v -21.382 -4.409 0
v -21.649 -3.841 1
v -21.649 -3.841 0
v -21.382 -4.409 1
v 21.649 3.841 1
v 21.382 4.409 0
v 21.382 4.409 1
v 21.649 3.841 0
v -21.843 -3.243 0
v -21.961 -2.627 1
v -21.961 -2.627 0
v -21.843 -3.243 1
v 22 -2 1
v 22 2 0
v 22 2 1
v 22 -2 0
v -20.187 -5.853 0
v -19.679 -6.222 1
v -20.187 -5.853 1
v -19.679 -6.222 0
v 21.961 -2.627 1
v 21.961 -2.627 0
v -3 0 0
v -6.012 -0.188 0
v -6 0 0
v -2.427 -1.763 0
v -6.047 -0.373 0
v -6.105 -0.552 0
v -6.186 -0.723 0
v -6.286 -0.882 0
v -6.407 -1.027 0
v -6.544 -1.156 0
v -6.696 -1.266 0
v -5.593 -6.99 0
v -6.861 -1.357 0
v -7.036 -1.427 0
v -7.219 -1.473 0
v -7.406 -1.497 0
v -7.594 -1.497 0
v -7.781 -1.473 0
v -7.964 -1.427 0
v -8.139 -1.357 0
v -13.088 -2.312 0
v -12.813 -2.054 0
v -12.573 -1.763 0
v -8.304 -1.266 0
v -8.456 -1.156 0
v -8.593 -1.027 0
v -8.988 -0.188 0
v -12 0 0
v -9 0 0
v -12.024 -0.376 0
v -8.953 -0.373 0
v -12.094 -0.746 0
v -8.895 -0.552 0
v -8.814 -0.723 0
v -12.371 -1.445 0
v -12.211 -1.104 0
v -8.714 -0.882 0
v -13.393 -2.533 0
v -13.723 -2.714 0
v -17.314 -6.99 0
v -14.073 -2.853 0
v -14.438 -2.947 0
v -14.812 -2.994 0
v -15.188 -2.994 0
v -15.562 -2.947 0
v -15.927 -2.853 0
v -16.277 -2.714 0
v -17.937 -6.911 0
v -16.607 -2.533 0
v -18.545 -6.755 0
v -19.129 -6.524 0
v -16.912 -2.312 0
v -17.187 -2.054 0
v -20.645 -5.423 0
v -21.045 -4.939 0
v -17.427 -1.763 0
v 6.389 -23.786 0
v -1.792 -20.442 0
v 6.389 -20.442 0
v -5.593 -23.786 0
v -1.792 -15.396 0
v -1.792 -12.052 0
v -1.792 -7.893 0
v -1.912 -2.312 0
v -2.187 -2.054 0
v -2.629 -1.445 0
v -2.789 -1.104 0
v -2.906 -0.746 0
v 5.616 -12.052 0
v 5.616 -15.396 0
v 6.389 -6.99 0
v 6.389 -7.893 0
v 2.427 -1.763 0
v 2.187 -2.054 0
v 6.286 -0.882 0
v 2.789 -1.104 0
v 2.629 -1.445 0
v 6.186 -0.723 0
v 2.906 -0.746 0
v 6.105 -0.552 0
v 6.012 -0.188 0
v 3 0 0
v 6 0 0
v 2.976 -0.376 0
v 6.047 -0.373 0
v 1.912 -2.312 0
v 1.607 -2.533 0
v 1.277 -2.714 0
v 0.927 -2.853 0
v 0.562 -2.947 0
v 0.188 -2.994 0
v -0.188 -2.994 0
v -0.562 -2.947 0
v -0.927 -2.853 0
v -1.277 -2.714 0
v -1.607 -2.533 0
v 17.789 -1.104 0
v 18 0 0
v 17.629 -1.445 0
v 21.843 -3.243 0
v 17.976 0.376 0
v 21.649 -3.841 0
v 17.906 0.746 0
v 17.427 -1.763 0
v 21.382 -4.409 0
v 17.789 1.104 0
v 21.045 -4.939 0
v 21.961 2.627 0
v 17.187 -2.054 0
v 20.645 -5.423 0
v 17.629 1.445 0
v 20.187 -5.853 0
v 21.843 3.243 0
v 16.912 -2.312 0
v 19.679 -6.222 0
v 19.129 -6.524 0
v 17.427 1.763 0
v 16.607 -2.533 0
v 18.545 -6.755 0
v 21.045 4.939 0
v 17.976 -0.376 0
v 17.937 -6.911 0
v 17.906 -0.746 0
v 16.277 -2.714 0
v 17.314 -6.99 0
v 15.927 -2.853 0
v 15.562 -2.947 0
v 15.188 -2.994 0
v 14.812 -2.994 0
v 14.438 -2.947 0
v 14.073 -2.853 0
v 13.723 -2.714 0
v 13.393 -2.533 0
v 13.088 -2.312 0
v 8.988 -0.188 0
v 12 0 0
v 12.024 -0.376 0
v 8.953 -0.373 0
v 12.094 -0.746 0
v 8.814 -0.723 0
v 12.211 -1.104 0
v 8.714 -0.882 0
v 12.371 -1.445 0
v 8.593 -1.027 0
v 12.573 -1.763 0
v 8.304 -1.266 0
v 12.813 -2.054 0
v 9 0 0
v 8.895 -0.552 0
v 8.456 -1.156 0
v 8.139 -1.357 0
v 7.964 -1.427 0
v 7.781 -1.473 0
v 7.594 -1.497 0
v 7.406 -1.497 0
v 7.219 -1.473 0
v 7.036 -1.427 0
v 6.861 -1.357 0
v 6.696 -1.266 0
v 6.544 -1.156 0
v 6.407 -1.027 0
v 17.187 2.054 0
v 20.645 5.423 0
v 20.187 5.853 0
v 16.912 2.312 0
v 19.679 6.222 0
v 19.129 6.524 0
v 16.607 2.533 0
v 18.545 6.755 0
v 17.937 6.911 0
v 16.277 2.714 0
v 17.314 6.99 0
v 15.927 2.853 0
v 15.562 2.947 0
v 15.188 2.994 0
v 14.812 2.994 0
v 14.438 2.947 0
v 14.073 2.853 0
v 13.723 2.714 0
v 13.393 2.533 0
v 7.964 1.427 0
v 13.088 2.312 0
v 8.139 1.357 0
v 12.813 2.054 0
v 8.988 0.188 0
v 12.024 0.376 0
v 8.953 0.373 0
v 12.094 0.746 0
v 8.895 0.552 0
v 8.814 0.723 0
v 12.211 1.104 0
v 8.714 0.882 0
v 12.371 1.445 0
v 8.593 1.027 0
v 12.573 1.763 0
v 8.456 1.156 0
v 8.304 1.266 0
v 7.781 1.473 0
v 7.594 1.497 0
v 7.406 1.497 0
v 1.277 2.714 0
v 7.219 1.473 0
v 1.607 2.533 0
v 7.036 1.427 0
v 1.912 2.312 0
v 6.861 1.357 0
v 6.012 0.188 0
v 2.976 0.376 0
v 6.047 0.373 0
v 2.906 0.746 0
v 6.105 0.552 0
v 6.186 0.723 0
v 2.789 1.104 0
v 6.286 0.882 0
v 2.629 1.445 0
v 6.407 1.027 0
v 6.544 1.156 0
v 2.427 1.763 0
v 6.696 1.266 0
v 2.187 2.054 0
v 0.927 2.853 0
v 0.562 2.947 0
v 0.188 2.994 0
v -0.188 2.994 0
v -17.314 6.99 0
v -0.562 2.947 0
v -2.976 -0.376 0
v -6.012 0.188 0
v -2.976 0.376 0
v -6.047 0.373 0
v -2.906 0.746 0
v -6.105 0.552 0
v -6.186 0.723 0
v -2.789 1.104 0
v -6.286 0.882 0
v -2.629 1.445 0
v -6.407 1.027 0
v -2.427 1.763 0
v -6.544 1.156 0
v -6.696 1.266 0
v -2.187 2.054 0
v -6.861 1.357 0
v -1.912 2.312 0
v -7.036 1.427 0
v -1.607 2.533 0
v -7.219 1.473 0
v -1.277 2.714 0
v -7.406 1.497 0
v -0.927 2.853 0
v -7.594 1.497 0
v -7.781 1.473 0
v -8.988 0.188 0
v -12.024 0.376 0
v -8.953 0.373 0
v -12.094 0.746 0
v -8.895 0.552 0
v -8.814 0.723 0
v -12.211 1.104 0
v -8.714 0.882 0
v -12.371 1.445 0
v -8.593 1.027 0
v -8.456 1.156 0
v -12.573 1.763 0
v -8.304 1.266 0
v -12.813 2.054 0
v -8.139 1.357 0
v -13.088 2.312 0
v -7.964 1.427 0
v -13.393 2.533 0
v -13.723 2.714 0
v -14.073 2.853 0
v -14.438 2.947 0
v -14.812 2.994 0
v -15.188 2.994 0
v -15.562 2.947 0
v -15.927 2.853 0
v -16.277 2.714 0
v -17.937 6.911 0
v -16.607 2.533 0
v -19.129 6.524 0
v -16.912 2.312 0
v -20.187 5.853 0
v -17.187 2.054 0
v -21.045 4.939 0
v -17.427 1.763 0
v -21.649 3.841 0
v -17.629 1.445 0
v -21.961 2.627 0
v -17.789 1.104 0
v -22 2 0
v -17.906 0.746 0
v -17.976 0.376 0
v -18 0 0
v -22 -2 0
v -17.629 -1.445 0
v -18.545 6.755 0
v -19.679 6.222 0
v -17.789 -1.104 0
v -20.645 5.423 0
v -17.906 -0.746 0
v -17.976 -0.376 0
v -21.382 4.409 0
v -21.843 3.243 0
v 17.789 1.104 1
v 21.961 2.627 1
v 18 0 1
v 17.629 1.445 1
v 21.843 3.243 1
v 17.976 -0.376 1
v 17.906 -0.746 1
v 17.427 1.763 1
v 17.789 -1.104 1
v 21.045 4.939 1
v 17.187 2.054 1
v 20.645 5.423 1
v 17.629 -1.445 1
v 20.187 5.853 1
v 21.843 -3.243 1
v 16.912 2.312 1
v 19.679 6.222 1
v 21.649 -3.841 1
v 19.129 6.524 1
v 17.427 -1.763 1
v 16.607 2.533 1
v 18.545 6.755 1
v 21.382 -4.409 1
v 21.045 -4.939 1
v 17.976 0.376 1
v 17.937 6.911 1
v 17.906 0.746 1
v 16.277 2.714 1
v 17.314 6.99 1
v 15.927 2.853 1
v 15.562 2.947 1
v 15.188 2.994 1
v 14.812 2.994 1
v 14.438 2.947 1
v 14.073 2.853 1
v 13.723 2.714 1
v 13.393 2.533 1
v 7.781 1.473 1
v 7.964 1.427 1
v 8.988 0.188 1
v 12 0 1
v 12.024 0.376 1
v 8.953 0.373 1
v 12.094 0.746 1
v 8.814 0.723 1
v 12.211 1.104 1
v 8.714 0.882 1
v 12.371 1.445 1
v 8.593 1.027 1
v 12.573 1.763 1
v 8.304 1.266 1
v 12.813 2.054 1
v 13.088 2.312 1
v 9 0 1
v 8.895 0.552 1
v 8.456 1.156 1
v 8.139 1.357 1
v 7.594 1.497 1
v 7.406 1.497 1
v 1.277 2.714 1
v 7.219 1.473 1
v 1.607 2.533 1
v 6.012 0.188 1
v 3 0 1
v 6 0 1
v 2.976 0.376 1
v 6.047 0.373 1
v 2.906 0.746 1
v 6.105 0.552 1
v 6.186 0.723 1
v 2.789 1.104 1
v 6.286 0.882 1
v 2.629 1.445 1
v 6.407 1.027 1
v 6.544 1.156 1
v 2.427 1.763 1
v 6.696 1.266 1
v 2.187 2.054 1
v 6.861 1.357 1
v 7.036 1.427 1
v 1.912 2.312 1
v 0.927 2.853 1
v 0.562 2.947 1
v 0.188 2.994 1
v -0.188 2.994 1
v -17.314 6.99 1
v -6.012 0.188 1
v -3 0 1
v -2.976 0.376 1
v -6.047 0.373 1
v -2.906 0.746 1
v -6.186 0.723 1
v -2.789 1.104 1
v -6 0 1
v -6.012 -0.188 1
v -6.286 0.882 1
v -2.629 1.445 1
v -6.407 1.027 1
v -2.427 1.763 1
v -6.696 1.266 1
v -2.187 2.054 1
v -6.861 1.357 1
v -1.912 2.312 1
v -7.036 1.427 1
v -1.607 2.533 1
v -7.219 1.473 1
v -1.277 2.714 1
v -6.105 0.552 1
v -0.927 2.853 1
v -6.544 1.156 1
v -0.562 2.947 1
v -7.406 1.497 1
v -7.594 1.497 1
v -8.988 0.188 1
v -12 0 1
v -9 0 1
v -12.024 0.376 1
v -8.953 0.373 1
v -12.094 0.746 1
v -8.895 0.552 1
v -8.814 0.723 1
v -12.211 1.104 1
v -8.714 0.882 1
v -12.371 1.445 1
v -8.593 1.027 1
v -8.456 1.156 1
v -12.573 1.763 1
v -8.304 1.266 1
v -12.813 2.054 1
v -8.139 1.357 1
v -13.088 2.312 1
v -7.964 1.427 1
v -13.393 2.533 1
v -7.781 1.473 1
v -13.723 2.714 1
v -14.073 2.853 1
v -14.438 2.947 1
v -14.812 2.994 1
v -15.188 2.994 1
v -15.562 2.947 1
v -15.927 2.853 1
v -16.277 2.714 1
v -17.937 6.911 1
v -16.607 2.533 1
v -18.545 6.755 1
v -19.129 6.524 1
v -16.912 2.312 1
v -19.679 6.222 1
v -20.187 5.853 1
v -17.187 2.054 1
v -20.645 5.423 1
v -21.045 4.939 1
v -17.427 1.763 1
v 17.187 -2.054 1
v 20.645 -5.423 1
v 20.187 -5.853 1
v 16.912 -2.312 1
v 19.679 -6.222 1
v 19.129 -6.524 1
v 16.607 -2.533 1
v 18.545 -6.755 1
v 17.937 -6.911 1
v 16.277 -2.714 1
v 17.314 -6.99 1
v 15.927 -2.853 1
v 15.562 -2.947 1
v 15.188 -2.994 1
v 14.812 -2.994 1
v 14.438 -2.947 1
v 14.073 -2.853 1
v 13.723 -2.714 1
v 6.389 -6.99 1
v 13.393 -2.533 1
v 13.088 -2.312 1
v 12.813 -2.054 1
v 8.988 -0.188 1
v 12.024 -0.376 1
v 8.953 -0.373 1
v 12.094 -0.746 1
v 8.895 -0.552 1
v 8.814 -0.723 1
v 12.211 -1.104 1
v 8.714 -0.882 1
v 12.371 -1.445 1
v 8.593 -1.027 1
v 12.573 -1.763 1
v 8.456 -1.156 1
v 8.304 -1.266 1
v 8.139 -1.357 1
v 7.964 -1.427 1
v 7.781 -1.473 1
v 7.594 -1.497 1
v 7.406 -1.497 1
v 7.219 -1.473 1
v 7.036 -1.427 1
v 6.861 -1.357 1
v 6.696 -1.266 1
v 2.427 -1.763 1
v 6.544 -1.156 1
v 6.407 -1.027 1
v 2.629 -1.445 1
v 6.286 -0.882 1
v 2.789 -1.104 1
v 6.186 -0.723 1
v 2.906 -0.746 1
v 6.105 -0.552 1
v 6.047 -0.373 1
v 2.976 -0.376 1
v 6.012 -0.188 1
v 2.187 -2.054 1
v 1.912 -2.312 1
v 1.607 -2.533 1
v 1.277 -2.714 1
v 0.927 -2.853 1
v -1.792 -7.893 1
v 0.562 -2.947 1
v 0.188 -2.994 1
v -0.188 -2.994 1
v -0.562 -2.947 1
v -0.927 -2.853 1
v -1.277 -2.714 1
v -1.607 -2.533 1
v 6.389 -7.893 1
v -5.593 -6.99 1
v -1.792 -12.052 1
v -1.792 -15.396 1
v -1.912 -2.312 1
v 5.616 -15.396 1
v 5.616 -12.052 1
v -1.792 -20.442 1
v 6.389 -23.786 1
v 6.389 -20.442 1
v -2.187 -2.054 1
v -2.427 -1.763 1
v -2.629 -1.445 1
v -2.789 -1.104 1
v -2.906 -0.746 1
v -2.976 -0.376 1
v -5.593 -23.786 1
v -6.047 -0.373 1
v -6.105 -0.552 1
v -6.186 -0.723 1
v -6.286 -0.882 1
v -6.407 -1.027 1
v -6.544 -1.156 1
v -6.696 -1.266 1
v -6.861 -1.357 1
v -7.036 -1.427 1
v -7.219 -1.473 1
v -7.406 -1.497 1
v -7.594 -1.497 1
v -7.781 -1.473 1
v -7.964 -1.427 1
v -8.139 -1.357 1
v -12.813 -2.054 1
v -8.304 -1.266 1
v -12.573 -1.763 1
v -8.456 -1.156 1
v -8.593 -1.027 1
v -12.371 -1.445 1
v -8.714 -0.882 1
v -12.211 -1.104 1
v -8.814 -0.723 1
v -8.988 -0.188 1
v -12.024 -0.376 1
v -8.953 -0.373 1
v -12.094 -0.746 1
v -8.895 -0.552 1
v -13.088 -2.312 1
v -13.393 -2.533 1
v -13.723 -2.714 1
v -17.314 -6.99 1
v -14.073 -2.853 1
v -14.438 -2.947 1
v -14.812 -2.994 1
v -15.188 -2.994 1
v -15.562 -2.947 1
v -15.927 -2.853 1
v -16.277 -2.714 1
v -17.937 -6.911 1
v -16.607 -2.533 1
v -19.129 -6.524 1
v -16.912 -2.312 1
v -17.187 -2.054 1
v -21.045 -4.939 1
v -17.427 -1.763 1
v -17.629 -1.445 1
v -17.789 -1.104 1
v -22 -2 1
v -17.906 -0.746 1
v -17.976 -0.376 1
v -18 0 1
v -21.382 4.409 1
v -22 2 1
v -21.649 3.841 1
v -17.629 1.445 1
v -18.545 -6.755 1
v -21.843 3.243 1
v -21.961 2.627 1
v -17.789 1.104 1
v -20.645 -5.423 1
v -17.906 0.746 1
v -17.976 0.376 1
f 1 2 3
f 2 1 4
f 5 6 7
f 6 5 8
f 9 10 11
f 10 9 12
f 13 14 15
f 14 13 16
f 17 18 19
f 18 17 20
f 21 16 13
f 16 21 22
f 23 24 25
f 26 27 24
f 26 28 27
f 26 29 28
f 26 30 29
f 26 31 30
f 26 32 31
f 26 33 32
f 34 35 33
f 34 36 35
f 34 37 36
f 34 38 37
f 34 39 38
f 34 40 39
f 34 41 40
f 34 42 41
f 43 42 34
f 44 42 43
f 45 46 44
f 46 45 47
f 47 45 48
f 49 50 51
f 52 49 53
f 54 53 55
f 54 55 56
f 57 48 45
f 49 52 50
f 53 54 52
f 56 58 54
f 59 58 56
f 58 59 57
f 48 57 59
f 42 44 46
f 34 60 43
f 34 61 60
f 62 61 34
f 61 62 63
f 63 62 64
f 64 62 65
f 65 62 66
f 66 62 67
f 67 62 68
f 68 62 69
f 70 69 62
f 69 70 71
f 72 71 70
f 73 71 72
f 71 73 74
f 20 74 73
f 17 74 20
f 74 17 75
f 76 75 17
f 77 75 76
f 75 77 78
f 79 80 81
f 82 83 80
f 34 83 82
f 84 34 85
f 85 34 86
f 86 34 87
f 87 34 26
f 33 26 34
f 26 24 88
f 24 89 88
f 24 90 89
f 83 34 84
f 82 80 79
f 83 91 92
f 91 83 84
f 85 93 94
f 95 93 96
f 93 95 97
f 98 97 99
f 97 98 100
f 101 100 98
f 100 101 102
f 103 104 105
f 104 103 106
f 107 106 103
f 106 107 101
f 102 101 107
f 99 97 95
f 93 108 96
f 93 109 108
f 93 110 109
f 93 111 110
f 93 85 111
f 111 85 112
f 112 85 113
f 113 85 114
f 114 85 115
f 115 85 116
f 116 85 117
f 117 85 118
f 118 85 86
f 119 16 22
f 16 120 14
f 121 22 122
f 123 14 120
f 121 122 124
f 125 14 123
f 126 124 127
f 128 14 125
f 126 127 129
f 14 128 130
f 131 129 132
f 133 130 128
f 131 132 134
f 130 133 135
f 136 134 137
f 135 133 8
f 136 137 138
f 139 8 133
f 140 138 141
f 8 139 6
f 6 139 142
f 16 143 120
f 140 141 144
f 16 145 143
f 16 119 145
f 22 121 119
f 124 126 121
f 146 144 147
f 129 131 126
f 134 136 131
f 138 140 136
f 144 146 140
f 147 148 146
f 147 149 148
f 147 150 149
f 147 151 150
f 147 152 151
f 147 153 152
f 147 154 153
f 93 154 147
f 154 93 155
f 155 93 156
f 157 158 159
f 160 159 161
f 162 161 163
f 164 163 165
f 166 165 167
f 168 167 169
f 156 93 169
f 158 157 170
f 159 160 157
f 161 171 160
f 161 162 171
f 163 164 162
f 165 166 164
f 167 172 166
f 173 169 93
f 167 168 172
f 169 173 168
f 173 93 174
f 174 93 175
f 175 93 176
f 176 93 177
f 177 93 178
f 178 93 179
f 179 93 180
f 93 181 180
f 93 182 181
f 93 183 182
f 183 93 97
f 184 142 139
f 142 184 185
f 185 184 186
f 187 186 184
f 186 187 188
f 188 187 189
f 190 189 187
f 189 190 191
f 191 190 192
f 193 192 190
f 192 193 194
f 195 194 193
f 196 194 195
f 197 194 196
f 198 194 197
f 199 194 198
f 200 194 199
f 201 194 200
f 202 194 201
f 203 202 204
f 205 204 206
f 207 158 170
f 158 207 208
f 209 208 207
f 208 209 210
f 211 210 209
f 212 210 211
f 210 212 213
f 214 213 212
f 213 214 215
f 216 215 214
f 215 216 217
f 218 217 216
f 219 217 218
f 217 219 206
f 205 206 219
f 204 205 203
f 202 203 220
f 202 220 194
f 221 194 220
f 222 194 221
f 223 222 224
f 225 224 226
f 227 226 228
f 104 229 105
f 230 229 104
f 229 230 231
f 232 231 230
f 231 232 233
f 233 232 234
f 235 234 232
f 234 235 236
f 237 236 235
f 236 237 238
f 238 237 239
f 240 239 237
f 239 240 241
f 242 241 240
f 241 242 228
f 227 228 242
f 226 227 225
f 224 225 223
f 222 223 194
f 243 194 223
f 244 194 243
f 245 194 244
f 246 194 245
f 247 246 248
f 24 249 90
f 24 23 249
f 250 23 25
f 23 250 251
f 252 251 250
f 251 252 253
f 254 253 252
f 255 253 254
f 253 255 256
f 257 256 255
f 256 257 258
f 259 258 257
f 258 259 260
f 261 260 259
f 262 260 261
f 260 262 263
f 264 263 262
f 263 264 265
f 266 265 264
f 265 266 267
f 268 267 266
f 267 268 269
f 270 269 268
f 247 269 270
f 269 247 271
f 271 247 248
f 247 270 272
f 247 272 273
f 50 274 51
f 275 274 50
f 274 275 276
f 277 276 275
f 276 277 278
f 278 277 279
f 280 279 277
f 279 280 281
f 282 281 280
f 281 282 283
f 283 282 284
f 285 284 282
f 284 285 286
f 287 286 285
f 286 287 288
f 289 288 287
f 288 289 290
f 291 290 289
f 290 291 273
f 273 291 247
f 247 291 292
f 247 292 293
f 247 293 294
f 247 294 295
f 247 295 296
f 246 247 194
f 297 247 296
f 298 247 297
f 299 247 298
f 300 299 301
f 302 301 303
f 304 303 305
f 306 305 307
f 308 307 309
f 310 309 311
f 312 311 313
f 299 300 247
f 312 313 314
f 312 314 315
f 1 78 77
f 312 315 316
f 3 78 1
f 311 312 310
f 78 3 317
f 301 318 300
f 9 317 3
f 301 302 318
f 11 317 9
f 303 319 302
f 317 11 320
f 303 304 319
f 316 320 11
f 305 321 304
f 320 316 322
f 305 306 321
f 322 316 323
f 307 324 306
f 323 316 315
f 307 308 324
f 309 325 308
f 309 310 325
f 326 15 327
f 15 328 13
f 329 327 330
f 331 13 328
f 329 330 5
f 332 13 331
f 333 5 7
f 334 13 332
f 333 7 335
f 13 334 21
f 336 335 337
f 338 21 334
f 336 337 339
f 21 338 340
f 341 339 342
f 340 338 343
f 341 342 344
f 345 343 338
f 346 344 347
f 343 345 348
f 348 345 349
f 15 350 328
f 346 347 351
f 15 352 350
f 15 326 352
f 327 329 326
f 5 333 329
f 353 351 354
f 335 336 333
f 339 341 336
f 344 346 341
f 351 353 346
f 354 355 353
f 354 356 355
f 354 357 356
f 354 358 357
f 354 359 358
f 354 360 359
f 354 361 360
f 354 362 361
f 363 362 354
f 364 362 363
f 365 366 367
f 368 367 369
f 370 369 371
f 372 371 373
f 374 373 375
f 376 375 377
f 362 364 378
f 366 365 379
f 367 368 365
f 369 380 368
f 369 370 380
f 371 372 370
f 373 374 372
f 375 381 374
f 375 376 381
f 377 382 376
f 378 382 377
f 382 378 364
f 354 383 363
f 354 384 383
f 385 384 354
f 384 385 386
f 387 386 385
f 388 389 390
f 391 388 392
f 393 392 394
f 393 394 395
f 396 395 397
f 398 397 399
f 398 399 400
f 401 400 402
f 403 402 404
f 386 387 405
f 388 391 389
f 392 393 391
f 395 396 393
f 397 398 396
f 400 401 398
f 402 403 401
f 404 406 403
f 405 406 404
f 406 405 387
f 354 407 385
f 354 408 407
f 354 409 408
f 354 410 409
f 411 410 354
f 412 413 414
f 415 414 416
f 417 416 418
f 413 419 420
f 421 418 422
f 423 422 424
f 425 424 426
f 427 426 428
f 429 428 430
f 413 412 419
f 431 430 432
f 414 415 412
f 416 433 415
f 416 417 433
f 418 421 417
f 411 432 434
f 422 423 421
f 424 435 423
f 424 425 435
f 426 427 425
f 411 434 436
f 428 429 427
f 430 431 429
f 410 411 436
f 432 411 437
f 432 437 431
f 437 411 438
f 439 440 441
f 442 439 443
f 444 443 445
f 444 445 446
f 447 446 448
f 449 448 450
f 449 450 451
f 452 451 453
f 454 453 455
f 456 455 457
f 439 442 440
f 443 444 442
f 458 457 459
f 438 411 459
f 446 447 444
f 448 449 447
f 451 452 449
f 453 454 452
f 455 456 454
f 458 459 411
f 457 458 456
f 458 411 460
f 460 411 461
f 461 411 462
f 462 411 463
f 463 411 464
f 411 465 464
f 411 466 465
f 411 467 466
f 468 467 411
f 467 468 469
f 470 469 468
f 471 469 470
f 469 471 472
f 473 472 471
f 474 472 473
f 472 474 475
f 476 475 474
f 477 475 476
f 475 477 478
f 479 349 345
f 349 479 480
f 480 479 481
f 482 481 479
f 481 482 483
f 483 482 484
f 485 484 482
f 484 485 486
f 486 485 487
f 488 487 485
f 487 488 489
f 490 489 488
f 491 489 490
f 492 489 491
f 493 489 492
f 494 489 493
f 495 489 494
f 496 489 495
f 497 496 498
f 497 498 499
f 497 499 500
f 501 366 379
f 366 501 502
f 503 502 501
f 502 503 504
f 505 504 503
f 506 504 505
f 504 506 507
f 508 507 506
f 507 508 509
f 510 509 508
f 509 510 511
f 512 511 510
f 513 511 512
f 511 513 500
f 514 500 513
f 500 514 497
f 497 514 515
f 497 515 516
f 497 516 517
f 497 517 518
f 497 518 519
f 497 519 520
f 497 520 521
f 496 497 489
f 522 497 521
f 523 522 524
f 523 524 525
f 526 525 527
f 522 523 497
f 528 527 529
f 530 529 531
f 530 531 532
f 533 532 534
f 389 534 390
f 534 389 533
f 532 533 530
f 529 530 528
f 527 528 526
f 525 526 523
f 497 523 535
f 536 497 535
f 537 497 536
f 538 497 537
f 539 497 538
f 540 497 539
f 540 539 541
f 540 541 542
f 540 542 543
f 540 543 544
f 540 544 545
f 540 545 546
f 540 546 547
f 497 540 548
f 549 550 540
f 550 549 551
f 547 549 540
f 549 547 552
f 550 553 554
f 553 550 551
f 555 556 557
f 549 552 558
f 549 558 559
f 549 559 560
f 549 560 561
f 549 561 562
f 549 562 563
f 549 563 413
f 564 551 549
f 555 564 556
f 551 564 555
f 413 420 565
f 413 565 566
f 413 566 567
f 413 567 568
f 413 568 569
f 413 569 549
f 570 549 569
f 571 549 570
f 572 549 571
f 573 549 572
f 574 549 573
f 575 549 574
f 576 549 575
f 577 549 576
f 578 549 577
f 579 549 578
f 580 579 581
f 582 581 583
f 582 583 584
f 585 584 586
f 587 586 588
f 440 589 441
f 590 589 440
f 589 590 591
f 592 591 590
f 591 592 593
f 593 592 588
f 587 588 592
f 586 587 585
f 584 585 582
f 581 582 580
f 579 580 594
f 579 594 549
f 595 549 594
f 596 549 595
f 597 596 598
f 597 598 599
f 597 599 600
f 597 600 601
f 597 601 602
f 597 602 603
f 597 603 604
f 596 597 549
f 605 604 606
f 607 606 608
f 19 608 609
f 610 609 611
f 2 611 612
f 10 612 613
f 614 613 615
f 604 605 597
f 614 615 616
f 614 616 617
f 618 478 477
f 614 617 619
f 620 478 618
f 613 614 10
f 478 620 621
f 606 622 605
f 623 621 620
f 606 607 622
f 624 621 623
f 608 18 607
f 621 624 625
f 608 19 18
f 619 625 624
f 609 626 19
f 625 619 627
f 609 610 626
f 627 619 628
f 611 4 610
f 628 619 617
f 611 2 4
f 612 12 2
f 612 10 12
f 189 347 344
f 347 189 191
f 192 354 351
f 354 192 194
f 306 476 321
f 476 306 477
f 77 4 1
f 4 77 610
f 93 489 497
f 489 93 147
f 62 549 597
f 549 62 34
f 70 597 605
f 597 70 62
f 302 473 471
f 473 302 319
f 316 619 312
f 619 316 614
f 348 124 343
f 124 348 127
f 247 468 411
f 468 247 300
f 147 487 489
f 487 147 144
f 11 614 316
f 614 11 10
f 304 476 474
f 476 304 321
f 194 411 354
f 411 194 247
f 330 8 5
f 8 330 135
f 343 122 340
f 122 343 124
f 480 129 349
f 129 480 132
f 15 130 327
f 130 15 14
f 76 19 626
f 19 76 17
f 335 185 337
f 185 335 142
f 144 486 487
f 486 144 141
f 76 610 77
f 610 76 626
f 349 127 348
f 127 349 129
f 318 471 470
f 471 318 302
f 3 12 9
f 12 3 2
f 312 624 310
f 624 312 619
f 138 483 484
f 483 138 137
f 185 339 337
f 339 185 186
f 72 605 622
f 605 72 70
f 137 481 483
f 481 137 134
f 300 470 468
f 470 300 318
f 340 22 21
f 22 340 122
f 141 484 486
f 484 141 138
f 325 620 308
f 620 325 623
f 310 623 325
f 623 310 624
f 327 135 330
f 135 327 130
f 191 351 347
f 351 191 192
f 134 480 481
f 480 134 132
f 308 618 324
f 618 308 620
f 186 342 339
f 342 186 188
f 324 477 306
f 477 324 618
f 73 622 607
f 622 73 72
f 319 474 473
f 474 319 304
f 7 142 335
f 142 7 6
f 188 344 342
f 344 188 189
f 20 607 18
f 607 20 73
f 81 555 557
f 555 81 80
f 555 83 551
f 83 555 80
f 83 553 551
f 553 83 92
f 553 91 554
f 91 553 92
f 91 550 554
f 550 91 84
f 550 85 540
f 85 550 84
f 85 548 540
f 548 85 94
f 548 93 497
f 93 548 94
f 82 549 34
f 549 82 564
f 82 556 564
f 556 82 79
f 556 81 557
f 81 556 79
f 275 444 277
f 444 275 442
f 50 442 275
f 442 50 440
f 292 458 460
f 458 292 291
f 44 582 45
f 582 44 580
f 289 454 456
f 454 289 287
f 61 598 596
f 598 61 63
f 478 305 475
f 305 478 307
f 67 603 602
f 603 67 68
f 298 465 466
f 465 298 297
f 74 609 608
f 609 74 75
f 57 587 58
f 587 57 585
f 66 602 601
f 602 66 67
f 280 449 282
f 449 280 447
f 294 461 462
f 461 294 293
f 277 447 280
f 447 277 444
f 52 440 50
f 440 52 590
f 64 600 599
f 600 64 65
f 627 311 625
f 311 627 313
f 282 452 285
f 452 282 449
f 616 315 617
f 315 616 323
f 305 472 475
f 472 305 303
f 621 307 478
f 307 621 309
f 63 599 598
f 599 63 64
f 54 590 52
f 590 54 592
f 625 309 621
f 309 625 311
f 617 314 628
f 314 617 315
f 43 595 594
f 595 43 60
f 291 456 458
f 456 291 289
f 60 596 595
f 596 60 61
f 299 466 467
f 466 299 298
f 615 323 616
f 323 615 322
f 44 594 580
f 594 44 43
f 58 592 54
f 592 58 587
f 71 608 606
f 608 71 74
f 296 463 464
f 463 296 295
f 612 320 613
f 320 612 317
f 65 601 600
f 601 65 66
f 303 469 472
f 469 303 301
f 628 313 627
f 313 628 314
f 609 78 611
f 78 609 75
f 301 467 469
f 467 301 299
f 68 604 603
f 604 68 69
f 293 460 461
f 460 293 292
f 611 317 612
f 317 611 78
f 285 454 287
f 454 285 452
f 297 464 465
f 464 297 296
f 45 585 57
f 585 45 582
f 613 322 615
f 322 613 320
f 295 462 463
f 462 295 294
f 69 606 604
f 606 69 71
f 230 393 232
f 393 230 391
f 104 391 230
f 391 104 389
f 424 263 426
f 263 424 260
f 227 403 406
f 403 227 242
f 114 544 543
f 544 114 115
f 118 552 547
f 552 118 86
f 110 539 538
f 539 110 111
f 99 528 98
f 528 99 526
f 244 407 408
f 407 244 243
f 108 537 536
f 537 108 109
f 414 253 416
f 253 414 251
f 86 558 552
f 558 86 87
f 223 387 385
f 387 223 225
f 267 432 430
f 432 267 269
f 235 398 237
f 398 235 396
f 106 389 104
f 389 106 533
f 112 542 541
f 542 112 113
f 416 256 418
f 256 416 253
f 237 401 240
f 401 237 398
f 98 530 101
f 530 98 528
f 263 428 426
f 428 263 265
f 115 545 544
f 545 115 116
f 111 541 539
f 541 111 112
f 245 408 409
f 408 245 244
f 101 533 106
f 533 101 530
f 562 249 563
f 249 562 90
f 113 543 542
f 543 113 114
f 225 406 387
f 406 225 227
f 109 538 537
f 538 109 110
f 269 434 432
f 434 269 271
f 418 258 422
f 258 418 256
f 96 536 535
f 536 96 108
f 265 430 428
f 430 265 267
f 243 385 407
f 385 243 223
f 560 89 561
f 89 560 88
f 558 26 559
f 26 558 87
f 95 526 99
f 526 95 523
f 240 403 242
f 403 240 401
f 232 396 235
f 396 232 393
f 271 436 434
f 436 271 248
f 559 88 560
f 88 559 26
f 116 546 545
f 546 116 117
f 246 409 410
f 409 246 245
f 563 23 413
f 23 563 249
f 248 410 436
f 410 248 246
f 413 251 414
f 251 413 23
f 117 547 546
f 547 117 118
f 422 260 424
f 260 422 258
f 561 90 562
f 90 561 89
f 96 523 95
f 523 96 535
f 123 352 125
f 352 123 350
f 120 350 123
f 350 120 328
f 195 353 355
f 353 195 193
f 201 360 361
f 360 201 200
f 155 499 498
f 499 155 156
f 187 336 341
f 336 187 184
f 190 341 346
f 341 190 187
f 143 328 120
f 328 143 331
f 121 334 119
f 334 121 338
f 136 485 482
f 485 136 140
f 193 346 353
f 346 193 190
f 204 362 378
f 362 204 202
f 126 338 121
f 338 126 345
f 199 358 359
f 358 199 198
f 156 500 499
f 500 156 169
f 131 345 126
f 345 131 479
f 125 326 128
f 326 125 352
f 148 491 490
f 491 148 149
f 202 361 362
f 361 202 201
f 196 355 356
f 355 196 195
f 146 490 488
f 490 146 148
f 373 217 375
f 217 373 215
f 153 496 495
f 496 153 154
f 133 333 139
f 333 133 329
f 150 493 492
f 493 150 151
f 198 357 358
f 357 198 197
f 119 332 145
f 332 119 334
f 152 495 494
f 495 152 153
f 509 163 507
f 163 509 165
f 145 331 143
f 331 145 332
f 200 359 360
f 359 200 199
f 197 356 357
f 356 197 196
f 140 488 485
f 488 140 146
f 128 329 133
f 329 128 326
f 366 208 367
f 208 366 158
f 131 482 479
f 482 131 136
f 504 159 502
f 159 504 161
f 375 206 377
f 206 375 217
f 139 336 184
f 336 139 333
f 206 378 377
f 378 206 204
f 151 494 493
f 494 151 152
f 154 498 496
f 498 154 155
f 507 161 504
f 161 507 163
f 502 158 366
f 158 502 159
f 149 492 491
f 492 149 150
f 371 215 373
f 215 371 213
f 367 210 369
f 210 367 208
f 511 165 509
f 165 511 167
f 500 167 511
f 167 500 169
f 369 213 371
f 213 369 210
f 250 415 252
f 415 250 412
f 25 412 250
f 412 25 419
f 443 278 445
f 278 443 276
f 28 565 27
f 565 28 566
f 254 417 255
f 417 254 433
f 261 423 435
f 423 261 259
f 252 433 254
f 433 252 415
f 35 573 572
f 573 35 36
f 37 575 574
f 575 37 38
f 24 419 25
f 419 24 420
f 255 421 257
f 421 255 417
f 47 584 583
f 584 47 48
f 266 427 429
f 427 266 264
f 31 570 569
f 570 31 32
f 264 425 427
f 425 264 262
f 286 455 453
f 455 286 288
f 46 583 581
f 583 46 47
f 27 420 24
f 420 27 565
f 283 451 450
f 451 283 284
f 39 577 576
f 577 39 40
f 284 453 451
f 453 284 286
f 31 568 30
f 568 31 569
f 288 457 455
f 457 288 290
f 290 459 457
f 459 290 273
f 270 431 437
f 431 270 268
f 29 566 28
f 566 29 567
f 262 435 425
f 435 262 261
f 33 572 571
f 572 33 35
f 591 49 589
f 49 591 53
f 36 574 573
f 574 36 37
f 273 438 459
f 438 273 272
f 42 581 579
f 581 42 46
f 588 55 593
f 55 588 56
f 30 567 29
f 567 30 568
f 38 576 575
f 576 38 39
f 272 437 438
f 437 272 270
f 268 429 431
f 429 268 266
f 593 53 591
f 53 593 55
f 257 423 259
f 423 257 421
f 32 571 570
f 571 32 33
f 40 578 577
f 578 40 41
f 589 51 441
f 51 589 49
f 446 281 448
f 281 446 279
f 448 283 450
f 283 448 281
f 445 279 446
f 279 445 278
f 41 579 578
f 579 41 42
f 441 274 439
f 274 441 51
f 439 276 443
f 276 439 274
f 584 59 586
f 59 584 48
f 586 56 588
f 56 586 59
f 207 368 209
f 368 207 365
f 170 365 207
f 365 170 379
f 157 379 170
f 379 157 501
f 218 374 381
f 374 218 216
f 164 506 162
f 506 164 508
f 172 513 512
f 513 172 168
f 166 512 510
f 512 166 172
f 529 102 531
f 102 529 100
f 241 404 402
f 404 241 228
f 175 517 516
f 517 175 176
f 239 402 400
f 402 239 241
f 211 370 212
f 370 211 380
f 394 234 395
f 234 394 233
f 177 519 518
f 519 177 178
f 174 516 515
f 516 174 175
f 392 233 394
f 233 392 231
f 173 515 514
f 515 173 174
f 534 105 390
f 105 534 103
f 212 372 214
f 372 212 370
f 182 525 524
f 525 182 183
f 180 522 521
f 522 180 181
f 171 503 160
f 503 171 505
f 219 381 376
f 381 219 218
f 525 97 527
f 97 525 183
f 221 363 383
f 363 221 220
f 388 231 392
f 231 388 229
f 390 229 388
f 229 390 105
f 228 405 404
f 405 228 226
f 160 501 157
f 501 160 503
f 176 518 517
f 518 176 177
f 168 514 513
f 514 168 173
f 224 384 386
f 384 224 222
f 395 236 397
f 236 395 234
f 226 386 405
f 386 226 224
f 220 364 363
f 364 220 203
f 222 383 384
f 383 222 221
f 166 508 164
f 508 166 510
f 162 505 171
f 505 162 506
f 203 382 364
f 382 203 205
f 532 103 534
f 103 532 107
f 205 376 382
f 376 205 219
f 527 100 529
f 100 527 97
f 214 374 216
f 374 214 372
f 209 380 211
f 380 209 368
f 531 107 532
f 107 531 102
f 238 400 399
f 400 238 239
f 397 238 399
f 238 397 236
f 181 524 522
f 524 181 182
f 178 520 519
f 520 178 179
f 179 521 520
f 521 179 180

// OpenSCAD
$fn = 50;


difference() {
	union() {
		*color(alpha = 1.0000000000, c = "gray") {
			translate(v = [0, 14, 0]) {
				linear_extrude(height = 1) {
					text(font = "Arial:style=Bold", halign = "center", size = 4.5000000000, text = "COMMENT description oobb_plate_shape_p_type_1_depth_3_width_1_thickness_e_extra_oobb_size", valign = "center");
				}
			}
		}
		hull() {
			translate(v = [-17.0000000000, 2.0000000000, 0]) {
				cylinder(h = 1, r = 5);
			}
			translate(v = [17.0000000000, 2.0000000000, 0]) {
				cylinder(h = 1, r = 5);
			}
			translate(v = [-17.0000000000, -2.0000000000, 0]) {
				cylinder(h = 1, r = 5);
			}
			translate(v = [17.0000000000, -2.0000000000, 0]) {
				cylinder(h = 1, r = 5);
			}
		}
		translate(v = [0, -5, 0]) {
			linear_extrude(height = 1) {
				text(font = "DejaVu Sans Mono:style=Bold", halign = "center", size = 19.0000000000, text = "E", valign = "top");
			}
		}
	}
	union() {
		*color(alpha = 1.0000000000, c = "gray") {
			translate(v = [0, 14, 0]) {
				linear_extrude(height = 1) {
					text(font = "Arial:style=Bold", halign = "center", size = 4.5000000000, text = "COMMENT description oobb_holes_shape_n_type_3_width_1_thickness_e_extra_oobb_size_1_height_'all'_holes_true_both_holes", valign = "center");
				}
			}
		}
		translate(v = [-15.0000000000, 0.0000000000, 0]) {
			translate(v = [0, 0, -50]) {
				cylinder(h = 100, r = 3.0000000000);
			}
		}
		translate(v = [0, 0, -50]) {
			cylinder(h = 100, r = 3.0000000000);
		}
		translate(v = [15.0000000000, 0.0000000000, 0]) {
			translate(v = [0, 0, -50]) {
				cylinder(h = 100, r = 3.0000000000);
			}
		}
		translate(v = [-15.0000000000, 0.0000000000, 0]) {
			translate(v = [0, 0, -50]) {
				cylinder(h = 100, r = 1.5000000000);
			}
		}
		translate(v = [-7.5000000000, 0.0000000000, 0]) {
			translate(v = [0, 0, -50]) {
				cylinder(h = 100, r = 1.5000000000);
			}
		}
		translate(v = [0, 0, -50]) {
			cylinder(h = 100, r = 1.5000000000);
		}
		translate(v = [7.5000000000, 0.0000000000, 0]) {
			translate(v = [0, 0, -50]) {
				cylinder(h = 100, r = 1.5000000000);
			}
		}
		translate(v = [15.0000000000, 0.0000000000, 0]) {
			translate(v = [0, 0, -50]) {
				cylinder(h = 100, r = 1.5000000000);
			}
		}
	}
}
